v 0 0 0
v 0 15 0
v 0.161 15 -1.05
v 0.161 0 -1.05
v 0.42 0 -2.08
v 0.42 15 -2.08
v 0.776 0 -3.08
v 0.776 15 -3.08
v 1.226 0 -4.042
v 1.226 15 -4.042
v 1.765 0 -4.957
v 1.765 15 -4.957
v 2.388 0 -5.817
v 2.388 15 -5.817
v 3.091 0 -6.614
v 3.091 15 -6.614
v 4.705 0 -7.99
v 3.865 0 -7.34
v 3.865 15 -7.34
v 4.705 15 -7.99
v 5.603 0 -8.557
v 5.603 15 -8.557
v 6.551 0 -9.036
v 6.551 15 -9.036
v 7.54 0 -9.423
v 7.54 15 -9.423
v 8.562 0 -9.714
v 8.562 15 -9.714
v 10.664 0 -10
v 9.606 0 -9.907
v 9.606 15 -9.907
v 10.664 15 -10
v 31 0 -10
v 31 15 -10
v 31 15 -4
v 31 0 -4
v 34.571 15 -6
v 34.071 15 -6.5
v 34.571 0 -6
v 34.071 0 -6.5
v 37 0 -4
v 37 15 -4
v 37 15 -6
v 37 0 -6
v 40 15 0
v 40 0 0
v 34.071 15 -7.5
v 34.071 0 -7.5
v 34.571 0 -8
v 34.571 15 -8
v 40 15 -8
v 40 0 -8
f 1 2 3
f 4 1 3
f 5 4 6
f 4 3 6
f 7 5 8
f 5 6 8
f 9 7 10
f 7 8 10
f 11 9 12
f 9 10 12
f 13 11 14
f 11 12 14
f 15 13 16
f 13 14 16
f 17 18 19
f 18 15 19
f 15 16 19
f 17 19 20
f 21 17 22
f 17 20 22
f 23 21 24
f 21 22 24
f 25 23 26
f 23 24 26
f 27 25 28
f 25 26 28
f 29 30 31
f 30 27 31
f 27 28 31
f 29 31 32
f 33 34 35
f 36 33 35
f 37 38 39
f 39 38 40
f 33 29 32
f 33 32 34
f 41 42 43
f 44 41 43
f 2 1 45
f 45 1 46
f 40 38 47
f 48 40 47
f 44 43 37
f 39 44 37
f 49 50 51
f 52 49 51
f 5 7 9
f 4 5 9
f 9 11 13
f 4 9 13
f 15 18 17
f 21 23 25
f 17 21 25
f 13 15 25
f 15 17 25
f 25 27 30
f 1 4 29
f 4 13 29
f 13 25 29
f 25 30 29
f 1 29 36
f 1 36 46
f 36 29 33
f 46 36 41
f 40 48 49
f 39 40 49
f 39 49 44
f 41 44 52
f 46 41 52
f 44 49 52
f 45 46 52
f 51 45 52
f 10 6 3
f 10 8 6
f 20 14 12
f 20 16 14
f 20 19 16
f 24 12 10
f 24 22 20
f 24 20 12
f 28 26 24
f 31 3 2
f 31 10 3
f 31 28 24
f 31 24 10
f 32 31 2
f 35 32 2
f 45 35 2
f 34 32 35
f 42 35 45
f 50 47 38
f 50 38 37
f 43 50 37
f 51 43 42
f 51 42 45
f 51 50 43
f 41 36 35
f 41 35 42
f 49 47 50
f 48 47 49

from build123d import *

# Parameters (mm, degrees)
SKETCH1_W           = 40
SKETCH1_H           = 10
BOSS_EXTRUDE1_DEPTH = 15
CUT_EXTRUDE1_DEPTH  = 44.874821937
CUT_EXTRUDE2_DEPTH  = 44.874821937
CHAMFER1_SIZE       = 0.5


with BuildPart() as part:
    # Sketch1 → Boss-Extrude1 (new body)
    with BuildSketch(Plane(origin=(0, 0, 0), x_dir=(1, 0, 0), z_dir=(0, 1, 0))):
        with Locations((20, 5)):
            Rectangle(SKETCH1_W, SKETCH1_H)
    extrude(amount=BOSS_EXTRUDE1_DEPTH)

    # Sketch2 → Cut-Extrude1 (cut, through all)
    with BuildSketch(Plane(origin=(0, 15, 0), x_dir=(1, 0, 0), z_dir=(0, 1, 0))):
        with BuildLine():
            Line((10.663840824, 10), (0, 10))
            Line((0, 10), (0, 0))
            ThreePointArc((0, 0), (3.469314238, 6.986253576), (10.663840824, 10))
        make_face()
    extrude(amount=-CUT_EXTRUDE1_DEPTH, mode=Mode.SUBTRACT)

    # Sketch3 → Cut-Extrude2 (cut, through all)
    with BuildSketch(Plane(origin=(0, 15, 0), x_dir=(1, 0, 0), z_dir=(0, 1, 0))):
        Polygon((40, 10), (31, 10), (31, 4), (37, 4), (37, 6), (34.071499669, 6), (34.071499669, 8), (40, 8), align=None)
    extrude(amount=-CUT_EXTRUDE2_DEPTH, mode=Mode.SUBTRACT)

    # Chamfer1
    chamfer1_edges = [part.edges().sort_by_distance(p)[0] for p in [
        (34.071499669, 7.5, -8),
        (34.071499669, 7.5, -6),
    ]]
    chamfer(chamfer1_edges, length=CHAMFER1_SIZE)


solid = part.part
